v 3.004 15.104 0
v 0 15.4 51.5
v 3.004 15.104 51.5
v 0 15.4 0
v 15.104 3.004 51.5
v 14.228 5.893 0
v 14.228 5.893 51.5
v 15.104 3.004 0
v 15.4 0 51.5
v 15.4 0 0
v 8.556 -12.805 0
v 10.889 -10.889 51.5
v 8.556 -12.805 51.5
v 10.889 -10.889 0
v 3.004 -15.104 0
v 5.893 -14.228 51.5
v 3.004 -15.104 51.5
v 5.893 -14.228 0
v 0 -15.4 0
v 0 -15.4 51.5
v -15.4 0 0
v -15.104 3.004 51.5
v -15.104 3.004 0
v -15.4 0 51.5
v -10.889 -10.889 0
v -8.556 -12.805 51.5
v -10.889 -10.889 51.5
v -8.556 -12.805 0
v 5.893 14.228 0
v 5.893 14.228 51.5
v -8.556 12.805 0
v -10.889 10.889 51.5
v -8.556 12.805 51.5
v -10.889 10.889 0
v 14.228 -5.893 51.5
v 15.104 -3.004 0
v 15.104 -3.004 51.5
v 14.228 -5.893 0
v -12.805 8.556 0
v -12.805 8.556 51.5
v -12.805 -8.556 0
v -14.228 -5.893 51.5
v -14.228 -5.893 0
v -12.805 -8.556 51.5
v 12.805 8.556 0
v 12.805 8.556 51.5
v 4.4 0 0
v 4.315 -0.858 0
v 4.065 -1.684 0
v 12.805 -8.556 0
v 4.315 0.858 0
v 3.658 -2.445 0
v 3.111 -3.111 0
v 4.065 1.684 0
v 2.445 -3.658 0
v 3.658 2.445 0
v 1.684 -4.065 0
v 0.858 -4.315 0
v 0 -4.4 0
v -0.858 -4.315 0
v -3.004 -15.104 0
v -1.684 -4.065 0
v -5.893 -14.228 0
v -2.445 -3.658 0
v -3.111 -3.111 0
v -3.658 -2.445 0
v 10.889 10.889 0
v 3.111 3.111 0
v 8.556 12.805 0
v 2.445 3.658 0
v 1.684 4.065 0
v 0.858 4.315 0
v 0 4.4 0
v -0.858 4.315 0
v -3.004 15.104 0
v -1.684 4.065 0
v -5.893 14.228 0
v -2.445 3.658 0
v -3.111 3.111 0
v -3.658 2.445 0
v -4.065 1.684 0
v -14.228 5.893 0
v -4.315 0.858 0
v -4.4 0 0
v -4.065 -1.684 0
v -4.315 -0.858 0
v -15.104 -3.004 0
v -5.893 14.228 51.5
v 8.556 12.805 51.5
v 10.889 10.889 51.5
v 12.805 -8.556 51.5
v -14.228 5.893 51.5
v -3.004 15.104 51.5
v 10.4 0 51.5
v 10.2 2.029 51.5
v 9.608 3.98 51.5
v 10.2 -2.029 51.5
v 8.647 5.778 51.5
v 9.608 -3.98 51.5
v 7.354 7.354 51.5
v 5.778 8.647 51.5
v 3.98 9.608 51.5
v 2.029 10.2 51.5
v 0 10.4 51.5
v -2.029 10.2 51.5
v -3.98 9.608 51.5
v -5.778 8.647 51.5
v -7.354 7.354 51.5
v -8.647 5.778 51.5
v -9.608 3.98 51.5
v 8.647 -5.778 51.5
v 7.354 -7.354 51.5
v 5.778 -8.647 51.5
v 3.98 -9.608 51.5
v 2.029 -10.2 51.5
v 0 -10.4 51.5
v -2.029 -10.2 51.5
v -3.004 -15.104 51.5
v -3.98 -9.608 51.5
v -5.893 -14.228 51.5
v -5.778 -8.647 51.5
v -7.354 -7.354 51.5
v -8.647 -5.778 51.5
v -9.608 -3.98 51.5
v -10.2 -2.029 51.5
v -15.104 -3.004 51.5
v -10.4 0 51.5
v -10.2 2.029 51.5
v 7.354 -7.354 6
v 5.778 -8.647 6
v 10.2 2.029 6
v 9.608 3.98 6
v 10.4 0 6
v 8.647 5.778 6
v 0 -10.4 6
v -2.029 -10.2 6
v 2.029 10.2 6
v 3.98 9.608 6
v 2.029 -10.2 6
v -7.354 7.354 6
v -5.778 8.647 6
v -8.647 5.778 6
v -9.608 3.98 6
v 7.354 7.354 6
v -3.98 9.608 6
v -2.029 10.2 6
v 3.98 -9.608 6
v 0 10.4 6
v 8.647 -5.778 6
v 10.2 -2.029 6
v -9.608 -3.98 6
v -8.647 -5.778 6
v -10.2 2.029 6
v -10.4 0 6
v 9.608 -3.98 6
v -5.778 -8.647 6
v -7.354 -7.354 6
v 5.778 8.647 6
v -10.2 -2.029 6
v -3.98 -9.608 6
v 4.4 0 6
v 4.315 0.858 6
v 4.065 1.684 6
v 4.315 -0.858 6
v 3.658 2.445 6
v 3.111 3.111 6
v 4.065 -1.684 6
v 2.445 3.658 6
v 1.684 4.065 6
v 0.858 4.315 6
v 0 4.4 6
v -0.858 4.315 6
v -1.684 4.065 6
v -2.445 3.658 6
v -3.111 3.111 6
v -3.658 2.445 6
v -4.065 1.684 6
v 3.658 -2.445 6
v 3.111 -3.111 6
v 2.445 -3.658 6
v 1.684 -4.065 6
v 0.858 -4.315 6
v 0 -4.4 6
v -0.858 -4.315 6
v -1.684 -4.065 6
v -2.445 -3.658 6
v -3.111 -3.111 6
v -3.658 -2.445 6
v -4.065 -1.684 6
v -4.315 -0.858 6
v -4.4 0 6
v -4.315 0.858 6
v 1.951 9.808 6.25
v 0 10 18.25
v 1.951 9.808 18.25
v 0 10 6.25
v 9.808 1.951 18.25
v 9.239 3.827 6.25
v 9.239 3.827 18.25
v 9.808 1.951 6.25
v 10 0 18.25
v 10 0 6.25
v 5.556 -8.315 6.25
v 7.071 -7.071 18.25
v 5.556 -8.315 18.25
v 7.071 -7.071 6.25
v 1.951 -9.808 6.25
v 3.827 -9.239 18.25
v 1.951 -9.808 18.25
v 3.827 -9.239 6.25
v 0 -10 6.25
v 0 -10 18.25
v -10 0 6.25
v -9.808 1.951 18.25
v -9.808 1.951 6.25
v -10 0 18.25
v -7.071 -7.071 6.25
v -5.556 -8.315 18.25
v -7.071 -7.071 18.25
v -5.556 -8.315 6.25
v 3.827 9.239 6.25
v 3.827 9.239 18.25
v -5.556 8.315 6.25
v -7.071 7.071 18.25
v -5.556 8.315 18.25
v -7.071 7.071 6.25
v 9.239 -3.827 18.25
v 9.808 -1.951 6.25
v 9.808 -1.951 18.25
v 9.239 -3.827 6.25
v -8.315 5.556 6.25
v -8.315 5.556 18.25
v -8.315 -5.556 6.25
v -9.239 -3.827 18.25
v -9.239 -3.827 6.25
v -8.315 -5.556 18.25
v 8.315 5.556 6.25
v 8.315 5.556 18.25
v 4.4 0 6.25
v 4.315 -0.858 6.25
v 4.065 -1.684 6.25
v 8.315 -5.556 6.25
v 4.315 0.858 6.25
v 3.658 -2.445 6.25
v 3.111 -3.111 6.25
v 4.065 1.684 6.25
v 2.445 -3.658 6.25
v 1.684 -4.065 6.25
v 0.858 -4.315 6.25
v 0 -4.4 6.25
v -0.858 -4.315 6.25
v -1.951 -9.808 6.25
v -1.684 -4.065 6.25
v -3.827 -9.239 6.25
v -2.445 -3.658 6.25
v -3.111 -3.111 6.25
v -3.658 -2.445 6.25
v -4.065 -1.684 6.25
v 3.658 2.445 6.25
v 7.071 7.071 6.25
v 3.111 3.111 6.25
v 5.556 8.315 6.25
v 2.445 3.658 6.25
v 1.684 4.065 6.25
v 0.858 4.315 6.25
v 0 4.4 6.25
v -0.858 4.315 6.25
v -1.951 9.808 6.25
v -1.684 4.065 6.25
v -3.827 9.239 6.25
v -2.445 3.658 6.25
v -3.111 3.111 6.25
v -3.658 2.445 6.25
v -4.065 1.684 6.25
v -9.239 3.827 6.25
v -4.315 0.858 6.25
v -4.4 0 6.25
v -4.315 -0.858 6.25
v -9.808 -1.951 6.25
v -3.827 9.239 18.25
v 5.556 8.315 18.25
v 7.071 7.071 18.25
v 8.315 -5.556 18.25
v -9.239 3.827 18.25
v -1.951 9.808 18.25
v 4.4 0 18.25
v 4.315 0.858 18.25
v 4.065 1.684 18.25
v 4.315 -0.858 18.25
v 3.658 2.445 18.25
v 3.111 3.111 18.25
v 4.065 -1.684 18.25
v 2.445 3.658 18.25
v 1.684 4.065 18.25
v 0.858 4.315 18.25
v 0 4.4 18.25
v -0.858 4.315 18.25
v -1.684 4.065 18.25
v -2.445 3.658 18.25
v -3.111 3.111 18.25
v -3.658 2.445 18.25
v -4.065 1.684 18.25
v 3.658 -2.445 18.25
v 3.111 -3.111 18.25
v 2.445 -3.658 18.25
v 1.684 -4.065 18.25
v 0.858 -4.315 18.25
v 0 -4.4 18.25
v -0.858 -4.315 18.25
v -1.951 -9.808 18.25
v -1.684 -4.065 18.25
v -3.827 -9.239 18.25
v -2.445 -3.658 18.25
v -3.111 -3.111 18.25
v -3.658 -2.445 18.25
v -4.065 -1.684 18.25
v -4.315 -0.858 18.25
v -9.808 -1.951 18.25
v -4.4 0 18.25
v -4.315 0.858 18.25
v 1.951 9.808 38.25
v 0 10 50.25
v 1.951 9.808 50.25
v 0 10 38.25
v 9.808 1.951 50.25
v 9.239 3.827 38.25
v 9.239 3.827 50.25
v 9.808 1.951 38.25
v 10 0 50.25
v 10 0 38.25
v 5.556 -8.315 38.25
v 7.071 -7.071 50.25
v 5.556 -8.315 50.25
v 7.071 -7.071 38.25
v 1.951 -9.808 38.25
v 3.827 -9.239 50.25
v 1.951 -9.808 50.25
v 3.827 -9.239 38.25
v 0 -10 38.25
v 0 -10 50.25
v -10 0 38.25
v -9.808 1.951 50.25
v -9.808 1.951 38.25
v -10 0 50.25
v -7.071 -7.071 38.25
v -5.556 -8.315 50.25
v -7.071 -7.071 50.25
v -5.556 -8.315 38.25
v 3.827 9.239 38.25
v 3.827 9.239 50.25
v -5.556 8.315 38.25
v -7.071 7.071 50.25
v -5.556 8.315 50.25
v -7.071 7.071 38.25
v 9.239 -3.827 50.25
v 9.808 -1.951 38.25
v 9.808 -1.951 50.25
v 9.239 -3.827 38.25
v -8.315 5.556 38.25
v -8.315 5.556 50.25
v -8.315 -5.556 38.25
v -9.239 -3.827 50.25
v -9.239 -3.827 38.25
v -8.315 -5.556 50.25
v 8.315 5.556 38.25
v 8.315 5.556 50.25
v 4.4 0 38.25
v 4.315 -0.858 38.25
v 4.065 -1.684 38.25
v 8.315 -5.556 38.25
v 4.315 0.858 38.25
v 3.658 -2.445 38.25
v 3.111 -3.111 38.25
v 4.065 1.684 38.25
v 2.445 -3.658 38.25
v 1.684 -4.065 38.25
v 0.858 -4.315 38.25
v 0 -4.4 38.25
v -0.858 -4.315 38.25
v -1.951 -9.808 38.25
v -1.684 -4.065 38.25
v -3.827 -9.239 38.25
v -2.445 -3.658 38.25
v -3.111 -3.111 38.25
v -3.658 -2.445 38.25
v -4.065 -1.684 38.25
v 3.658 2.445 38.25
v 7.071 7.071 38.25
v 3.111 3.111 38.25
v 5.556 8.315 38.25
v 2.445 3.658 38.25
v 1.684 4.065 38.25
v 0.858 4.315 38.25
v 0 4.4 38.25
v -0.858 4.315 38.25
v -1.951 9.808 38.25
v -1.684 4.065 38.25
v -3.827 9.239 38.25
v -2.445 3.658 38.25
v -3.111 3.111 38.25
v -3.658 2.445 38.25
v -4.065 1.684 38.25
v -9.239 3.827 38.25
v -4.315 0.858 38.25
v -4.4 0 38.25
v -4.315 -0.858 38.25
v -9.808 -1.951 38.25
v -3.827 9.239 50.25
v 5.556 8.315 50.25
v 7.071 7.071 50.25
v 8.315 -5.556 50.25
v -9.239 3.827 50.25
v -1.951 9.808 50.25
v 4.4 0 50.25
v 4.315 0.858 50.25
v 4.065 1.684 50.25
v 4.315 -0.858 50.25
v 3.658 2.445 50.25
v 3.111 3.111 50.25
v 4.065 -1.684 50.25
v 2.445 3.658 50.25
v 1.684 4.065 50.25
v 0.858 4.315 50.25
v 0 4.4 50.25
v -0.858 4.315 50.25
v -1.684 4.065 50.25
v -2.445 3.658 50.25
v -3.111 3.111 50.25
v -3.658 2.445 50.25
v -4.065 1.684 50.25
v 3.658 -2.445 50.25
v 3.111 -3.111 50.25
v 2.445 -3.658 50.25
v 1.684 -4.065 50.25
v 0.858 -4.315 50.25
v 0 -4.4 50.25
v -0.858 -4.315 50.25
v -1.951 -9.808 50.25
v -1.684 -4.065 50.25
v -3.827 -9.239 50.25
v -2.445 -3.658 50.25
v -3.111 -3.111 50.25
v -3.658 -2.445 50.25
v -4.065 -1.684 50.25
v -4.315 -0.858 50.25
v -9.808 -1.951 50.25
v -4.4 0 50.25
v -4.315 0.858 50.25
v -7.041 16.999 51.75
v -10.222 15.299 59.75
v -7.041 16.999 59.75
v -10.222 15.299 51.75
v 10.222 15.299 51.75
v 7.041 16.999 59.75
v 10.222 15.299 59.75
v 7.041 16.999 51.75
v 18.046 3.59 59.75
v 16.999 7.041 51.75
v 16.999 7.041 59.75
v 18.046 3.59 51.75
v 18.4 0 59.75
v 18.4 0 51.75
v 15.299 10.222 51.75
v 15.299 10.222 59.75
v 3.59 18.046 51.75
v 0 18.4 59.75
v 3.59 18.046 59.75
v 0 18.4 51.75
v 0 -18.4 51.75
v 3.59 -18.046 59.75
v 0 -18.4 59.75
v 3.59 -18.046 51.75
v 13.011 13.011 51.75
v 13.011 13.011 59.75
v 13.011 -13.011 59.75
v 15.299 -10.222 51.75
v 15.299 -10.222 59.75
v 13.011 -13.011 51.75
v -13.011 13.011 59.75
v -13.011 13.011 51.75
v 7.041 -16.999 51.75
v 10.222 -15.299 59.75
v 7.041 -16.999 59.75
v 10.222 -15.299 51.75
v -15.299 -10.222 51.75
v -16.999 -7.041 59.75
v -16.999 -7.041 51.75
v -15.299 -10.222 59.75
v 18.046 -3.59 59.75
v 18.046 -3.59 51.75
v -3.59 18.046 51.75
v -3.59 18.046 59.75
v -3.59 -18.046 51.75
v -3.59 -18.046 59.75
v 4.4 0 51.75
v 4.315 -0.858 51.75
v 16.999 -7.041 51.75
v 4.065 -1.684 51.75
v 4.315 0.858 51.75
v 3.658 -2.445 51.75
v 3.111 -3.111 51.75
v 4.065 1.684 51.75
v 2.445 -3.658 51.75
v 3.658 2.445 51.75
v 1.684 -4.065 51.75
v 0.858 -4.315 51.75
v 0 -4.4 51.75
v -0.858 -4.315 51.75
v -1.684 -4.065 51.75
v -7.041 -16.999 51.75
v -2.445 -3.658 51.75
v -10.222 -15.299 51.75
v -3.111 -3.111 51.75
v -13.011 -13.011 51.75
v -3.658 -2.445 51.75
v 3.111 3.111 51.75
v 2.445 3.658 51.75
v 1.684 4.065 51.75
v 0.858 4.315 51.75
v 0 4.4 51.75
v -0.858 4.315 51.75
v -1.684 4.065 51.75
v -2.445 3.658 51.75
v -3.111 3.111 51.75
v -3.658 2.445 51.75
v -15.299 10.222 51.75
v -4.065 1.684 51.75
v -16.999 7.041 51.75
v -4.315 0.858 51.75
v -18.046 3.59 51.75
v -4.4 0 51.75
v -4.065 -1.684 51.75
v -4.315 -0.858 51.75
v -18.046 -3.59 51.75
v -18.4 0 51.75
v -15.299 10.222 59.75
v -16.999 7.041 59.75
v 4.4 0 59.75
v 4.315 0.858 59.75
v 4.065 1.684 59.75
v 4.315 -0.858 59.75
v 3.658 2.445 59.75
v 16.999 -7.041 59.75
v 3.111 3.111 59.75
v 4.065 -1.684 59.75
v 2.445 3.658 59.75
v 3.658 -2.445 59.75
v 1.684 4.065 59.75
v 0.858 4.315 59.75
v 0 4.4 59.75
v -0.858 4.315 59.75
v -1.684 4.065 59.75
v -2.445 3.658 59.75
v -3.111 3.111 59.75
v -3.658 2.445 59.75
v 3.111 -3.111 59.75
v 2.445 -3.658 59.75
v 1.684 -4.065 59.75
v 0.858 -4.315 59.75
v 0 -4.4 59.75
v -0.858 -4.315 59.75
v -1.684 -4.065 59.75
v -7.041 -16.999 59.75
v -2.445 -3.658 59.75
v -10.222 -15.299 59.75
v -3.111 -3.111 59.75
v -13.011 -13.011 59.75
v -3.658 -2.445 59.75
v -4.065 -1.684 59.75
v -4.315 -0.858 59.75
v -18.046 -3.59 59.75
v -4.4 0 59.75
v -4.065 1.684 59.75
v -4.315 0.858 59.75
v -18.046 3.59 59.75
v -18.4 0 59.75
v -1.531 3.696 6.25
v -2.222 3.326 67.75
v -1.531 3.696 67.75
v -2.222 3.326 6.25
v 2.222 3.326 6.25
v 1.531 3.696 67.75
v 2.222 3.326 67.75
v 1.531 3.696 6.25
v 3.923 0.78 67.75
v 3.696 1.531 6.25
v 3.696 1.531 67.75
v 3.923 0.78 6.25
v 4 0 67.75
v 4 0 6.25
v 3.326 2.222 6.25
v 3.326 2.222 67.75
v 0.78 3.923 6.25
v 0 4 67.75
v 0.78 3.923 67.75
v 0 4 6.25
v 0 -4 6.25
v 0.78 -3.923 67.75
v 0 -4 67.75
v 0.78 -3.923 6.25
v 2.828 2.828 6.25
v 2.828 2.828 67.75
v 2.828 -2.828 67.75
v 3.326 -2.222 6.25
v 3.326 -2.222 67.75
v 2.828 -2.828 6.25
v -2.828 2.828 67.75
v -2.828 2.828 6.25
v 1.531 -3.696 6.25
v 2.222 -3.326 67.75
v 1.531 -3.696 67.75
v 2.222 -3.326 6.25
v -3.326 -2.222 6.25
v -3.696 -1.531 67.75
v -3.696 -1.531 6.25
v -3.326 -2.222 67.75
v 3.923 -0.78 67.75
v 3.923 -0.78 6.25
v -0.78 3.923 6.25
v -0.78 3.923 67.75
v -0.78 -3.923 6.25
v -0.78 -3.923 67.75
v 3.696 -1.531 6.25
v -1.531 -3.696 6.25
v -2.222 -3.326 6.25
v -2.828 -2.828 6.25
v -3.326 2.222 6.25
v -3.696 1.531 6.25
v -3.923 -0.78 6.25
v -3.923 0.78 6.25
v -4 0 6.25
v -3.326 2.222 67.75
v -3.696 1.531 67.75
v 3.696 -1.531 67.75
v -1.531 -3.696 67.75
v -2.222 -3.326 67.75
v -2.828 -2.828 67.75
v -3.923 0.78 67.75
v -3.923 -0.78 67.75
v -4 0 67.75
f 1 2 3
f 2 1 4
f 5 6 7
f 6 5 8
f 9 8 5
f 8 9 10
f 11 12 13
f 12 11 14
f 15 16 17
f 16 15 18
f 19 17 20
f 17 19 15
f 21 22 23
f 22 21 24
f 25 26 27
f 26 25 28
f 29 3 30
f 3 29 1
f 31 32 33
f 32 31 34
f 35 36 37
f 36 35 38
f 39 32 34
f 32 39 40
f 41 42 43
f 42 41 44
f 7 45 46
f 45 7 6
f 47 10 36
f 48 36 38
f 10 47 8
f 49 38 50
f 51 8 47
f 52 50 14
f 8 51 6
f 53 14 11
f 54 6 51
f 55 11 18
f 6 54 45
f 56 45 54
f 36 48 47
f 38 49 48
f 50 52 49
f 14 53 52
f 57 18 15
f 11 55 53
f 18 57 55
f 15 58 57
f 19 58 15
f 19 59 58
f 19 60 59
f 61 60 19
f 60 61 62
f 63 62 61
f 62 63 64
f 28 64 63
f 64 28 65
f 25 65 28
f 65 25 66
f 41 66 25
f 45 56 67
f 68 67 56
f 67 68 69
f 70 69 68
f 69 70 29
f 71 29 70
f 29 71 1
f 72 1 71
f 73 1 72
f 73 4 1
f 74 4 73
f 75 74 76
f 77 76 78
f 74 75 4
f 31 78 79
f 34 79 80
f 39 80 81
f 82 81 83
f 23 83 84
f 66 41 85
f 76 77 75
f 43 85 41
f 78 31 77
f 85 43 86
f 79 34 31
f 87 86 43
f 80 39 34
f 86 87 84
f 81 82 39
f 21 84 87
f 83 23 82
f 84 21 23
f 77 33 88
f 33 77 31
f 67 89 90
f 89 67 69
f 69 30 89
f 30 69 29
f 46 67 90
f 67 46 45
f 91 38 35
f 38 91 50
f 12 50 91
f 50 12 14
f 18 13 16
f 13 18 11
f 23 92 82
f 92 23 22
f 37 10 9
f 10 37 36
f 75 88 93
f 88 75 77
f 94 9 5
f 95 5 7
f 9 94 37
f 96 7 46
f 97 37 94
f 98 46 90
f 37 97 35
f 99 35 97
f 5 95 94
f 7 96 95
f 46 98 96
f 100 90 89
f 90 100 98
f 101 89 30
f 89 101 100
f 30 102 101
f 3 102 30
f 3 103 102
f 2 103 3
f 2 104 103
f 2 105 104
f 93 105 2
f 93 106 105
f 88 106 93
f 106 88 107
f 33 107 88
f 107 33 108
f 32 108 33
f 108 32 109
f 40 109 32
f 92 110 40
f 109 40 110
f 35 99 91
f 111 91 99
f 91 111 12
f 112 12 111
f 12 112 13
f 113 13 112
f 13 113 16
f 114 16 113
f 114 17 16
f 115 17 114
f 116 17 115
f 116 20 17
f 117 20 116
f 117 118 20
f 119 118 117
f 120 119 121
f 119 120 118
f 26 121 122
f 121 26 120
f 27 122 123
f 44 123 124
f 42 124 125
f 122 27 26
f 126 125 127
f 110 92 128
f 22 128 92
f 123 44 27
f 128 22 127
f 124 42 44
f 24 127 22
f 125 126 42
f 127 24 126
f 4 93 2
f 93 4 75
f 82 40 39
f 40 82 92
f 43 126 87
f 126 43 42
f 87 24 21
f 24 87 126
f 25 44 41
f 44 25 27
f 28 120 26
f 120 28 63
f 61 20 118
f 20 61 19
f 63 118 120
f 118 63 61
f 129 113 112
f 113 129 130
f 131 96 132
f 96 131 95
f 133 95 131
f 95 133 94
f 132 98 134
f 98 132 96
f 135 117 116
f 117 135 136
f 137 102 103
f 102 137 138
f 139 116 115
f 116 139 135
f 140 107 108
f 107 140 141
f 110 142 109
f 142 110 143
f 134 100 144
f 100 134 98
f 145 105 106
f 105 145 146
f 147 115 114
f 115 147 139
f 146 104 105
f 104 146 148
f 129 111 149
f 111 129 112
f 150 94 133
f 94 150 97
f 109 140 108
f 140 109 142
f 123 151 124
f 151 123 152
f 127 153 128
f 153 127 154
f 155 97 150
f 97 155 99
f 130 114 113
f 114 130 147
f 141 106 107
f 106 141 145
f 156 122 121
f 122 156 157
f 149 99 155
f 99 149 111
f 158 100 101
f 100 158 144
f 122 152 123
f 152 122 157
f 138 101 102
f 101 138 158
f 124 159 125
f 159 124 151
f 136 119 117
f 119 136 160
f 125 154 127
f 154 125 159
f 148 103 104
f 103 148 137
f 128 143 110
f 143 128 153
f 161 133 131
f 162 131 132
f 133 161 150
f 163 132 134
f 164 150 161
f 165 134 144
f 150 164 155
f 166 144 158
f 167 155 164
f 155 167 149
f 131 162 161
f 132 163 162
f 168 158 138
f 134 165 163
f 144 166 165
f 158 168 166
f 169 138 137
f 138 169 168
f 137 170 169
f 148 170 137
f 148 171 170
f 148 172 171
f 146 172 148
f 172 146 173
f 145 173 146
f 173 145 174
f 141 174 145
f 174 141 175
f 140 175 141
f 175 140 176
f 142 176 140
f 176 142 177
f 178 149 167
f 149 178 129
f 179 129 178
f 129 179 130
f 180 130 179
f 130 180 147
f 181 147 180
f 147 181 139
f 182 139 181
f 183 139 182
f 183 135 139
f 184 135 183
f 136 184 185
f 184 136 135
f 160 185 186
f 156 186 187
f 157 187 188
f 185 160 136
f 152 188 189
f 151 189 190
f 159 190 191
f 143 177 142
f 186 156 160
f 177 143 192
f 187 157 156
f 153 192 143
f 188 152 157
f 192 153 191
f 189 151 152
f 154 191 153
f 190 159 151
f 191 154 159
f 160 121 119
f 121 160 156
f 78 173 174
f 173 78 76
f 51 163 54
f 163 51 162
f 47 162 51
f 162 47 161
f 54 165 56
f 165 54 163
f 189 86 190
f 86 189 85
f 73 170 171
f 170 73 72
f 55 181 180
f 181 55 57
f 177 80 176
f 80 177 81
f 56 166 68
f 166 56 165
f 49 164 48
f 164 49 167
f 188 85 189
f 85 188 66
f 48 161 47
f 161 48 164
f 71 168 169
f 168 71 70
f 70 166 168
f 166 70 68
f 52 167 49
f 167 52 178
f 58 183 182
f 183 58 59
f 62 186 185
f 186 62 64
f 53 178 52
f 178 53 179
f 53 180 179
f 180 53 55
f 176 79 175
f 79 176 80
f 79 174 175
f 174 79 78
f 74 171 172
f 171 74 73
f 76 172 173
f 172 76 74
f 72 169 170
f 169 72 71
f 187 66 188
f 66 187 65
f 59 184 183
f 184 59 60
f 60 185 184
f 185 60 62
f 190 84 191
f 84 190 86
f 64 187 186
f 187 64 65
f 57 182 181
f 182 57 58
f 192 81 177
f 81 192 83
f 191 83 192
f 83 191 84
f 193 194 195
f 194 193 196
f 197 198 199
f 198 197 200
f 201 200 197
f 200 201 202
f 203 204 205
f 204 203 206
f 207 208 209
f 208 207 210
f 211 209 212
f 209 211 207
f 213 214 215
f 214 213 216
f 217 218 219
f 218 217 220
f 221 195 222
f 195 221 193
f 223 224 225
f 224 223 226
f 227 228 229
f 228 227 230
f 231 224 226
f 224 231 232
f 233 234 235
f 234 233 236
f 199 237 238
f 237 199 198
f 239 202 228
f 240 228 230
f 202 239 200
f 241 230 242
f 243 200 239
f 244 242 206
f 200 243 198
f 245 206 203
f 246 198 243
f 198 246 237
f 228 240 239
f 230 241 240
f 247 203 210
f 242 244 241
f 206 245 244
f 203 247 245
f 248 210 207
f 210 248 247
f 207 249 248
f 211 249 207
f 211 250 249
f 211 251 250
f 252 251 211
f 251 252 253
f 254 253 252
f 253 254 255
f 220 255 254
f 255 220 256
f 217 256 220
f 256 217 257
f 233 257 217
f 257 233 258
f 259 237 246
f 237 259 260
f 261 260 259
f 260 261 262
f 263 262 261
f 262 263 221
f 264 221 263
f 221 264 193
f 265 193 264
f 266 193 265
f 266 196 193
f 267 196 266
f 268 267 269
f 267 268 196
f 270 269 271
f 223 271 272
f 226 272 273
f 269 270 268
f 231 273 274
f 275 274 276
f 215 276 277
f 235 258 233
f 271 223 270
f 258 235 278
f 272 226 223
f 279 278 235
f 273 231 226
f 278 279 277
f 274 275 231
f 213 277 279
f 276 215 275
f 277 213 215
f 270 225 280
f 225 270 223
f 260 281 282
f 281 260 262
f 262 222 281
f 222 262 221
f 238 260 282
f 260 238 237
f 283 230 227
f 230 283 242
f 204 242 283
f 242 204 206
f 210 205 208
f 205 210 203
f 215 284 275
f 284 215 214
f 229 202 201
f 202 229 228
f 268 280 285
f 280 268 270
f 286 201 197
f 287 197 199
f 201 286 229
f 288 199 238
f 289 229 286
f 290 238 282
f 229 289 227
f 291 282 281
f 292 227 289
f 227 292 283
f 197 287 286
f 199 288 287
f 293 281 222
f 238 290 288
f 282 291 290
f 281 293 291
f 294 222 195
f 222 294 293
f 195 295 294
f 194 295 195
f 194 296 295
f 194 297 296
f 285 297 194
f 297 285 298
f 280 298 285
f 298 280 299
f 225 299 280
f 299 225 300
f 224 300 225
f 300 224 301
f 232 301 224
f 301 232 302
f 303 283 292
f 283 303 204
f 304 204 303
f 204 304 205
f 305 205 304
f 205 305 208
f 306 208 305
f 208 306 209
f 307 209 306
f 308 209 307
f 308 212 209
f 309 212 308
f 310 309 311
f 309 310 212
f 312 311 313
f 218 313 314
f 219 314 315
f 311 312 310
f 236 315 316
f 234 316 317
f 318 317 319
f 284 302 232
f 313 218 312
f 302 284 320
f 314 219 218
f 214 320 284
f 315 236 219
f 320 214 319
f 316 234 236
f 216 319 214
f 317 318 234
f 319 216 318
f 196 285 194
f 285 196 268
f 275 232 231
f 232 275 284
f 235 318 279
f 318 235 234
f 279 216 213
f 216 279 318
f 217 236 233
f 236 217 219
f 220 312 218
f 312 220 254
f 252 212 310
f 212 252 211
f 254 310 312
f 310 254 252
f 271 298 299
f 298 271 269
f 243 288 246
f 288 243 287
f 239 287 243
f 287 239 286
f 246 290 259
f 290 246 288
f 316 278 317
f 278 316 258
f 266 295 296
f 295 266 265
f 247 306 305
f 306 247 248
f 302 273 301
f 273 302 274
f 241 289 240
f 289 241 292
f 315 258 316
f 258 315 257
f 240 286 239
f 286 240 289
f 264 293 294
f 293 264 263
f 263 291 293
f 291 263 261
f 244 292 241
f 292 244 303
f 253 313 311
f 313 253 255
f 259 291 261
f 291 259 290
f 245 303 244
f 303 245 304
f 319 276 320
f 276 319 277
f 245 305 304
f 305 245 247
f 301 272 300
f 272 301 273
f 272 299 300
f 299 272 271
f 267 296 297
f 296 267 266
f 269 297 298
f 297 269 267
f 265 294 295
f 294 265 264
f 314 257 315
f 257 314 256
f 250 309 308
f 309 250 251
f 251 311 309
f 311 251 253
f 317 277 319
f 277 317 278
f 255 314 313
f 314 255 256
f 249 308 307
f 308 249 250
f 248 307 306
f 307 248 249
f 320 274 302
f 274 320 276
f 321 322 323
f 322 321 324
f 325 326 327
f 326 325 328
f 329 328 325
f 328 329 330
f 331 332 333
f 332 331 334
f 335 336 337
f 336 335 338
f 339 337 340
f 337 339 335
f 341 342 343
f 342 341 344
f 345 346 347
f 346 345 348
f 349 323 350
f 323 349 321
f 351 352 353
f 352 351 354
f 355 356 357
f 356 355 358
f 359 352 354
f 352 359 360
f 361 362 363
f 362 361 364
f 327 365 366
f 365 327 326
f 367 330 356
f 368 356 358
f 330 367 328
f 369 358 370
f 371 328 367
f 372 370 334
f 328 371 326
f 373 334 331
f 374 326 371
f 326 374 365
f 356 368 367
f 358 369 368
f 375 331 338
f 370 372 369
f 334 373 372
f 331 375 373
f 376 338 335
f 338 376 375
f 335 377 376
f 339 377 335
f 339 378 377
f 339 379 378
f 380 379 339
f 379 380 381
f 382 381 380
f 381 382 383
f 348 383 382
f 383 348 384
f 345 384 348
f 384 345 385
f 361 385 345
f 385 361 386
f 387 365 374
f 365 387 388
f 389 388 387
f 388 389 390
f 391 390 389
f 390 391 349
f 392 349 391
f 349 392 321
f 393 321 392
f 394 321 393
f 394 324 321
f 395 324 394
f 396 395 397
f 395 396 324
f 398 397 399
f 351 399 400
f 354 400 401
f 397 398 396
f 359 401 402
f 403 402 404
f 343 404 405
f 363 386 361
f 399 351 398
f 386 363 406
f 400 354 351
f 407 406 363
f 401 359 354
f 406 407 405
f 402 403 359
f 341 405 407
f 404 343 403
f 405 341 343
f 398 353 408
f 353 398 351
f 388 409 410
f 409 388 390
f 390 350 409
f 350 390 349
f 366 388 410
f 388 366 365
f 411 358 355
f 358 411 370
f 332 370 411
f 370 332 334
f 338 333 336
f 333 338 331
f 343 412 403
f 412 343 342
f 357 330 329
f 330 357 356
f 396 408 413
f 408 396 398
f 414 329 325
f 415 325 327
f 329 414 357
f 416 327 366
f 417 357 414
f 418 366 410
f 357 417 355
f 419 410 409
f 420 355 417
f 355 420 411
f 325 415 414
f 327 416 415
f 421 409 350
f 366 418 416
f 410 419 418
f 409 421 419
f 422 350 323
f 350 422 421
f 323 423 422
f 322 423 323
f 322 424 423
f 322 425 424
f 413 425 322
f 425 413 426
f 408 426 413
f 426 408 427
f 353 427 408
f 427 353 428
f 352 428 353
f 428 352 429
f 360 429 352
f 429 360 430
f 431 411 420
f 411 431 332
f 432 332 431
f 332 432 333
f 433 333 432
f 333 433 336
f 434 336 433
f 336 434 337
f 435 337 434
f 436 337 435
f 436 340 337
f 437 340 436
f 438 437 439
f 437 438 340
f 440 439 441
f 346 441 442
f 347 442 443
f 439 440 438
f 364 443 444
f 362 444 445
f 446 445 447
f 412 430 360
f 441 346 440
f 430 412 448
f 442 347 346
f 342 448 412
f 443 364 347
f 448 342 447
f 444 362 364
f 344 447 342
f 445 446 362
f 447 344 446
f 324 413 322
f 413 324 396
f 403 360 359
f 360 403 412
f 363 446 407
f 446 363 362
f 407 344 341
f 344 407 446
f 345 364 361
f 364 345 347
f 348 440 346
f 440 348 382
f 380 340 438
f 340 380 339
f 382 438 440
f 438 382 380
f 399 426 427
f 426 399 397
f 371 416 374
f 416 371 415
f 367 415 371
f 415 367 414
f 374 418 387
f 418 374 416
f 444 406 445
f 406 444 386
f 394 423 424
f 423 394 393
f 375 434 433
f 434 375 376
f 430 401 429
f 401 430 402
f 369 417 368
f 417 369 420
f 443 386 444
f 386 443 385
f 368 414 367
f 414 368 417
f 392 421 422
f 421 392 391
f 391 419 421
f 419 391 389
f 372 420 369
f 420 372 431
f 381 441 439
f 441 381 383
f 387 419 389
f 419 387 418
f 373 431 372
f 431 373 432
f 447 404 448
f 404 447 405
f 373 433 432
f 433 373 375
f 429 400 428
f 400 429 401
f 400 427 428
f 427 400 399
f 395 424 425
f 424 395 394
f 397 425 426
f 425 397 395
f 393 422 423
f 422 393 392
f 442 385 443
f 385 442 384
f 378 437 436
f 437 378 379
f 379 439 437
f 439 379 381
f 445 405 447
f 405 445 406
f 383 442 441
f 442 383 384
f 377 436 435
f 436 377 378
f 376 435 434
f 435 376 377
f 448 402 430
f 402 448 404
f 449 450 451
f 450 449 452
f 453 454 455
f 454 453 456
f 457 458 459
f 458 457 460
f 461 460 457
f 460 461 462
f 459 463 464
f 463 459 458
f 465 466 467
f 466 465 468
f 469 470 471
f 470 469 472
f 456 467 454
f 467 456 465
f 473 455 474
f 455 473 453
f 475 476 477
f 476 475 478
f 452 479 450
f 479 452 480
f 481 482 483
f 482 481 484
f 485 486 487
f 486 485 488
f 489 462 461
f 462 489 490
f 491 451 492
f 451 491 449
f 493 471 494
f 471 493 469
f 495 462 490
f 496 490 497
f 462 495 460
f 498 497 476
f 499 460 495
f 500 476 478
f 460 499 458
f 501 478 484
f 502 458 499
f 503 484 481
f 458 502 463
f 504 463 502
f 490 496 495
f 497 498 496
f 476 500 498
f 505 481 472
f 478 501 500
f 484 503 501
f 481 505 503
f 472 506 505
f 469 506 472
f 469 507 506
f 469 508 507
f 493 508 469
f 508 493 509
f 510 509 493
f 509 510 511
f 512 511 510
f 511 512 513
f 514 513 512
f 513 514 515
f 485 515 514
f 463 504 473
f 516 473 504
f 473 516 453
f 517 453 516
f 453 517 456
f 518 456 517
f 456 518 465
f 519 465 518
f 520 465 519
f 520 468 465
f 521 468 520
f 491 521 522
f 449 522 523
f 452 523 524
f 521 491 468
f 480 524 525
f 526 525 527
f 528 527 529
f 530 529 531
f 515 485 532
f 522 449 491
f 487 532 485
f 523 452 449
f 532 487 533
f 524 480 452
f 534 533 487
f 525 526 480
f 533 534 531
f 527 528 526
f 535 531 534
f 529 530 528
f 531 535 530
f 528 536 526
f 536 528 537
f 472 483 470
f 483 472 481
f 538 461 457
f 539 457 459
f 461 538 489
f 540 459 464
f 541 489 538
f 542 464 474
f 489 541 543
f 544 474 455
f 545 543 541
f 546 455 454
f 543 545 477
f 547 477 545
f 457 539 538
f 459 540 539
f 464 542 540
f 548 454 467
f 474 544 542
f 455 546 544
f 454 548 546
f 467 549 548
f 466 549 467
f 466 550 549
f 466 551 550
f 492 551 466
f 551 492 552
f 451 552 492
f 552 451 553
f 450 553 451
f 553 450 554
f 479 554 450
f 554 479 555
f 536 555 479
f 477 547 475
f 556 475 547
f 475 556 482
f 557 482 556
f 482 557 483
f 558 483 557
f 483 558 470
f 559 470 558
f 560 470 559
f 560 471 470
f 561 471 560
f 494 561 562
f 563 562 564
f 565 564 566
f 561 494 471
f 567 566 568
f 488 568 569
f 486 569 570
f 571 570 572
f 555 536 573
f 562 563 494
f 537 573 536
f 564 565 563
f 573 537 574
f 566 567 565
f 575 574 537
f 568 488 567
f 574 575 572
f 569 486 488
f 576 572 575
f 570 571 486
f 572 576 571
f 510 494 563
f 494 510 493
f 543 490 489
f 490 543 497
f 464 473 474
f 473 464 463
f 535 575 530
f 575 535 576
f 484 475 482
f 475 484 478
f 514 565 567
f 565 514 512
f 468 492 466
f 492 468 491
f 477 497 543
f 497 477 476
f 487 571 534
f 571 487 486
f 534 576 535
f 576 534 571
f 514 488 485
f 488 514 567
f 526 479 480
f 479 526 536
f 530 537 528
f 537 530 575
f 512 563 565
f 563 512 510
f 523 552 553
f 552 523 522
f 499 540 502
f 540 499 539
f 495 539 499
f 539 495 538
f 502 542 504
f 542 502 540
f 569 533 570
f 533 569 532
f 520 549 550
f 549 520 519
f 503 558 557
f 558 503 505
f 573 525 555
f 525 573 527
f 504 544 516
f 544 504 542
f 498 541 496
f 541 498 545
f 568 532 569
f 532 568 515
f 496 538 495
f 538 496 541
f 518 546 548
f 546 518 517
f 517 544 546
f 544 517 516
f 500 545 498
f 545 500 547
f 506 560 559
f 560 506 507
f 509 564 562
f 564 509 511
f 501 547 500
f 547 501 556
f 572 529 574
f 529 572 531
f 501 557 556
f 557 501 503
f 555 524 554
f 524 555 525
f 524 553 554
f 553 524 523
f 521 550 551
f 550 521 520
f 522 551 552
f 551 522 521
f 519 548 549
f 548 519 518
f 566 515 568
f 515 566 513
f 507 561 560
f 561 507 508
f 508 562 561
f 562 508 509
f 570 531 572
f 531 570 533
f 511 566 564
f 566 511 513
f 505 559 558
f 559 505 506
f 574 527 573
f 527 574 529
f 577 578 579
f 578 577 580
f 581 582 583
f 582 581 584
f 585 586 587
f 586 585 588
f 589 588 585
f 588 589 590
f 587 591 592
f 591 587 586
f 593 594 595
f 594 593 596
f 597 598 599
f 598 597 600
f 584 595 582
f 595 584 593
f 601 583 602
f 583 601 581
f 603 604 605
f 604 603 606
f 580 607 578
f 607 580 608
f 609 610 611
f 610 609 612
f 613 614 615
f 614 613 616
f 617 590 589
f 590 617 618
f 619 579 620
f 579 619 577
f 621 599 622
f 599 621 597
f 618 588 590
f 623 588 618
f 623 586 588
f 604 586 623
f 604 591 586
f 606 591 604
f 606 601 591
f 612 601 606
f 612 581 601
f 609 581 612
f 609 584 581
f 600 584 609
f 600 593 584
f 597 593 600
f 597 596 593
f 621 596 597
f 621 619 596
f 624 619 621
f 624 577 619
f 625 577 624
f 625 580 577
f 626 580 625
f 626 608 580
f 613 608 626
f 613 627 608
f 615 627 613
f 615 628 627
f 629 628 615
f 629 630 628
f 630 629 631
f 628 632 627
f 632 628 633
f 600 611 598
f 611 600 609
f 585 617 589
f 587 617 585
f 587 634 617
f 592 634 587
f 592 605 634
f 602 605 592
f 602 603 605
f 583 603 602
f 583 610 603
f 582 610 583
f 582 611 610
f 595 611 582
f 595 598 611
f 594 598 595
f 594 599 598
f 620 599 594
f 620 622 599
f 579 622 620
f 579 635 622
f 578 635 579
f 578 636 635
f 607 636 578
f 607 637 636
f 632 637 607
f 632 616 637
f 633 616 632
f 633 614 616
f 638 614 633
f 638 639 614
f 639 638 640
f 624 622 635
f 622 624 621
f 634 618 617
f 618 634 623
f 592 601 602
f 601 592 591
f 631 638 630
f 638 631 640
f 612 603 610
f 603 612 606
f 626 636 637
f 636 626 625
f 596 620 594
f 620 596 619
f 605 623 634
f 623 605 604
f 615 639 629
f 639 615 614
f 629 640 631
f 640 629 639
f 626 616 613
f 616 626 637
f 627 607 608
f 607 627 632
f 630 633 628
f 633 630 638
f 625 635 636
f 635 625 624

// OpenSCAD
$fn = 32;

// ------------------------------------------------------------------------
// Shaft station: cup d30.8 x 51.5 mm, shaft d8
// Every part is its own module, assembly() places every instance.
// ------------------------------------------------------------------------

// --- part 1 ---
module housing_cup() {
  difference() {
    cylinder(h = 51.5, d = 30.8);
    translate([0, 0, 6]) cylinder(h = 46.5, d = 20.8);
    translate([0, 0, -1]) cylinder(h = 8, d = 8.8);
  }
}

// --- part 2 ---
module bearing_lower() {
  difference() {
      translate([0, 0, 0]) cylinder(h = 12, d = 20);
      translate([0, 0, -1]) cylinder(h = 14, d = 8.8);
    }
}

// --- part 3 ---
module bearing_upper() {
  difference() {
      translate([0, 0, 0]) cylinder(h = 12, d = 20);
      translate([0, 0, -1]) cylinder(h = 14, d = 8.8);
    }
}

// --- part 4 ---
module station_shaft() {
  translate([0, 0, -30.75]) cylinder(h = 61.5, d = 8);
}

// --- part 5 ---
module station_cover() {
  difference() {
    cylinder(h = 8, d = 36.8);
    translate([0, 0, -1]) cylinder(h = 10, d = 8.8);
  }
}

// --- assembly ---
module assembly() {
  color([0.80, 0.24, 0.20]) translate([0, 0, 0]) rotate([0, 0, 0]) housing_cup();
  color([0.20, 0.45, 0.75]) translate([0, 0, 6.25]) rotate([0, 0, 0]) bearing_lower();
  color([0.25, 0.62, 0.32]) translate([0, 0, 38.25]) rotate([0, 0, 0]) bearing_upper();
  color([0.92, 0.70, 0.18]) translate([0, 0, 37]) rotate([0, 0, 0]) station_shaft();
  color([0.58, 0.35, 0.70]) translate([0, 0, 51.75]) rotate([0, 0, 0]) station_cover();
}

assembly();
